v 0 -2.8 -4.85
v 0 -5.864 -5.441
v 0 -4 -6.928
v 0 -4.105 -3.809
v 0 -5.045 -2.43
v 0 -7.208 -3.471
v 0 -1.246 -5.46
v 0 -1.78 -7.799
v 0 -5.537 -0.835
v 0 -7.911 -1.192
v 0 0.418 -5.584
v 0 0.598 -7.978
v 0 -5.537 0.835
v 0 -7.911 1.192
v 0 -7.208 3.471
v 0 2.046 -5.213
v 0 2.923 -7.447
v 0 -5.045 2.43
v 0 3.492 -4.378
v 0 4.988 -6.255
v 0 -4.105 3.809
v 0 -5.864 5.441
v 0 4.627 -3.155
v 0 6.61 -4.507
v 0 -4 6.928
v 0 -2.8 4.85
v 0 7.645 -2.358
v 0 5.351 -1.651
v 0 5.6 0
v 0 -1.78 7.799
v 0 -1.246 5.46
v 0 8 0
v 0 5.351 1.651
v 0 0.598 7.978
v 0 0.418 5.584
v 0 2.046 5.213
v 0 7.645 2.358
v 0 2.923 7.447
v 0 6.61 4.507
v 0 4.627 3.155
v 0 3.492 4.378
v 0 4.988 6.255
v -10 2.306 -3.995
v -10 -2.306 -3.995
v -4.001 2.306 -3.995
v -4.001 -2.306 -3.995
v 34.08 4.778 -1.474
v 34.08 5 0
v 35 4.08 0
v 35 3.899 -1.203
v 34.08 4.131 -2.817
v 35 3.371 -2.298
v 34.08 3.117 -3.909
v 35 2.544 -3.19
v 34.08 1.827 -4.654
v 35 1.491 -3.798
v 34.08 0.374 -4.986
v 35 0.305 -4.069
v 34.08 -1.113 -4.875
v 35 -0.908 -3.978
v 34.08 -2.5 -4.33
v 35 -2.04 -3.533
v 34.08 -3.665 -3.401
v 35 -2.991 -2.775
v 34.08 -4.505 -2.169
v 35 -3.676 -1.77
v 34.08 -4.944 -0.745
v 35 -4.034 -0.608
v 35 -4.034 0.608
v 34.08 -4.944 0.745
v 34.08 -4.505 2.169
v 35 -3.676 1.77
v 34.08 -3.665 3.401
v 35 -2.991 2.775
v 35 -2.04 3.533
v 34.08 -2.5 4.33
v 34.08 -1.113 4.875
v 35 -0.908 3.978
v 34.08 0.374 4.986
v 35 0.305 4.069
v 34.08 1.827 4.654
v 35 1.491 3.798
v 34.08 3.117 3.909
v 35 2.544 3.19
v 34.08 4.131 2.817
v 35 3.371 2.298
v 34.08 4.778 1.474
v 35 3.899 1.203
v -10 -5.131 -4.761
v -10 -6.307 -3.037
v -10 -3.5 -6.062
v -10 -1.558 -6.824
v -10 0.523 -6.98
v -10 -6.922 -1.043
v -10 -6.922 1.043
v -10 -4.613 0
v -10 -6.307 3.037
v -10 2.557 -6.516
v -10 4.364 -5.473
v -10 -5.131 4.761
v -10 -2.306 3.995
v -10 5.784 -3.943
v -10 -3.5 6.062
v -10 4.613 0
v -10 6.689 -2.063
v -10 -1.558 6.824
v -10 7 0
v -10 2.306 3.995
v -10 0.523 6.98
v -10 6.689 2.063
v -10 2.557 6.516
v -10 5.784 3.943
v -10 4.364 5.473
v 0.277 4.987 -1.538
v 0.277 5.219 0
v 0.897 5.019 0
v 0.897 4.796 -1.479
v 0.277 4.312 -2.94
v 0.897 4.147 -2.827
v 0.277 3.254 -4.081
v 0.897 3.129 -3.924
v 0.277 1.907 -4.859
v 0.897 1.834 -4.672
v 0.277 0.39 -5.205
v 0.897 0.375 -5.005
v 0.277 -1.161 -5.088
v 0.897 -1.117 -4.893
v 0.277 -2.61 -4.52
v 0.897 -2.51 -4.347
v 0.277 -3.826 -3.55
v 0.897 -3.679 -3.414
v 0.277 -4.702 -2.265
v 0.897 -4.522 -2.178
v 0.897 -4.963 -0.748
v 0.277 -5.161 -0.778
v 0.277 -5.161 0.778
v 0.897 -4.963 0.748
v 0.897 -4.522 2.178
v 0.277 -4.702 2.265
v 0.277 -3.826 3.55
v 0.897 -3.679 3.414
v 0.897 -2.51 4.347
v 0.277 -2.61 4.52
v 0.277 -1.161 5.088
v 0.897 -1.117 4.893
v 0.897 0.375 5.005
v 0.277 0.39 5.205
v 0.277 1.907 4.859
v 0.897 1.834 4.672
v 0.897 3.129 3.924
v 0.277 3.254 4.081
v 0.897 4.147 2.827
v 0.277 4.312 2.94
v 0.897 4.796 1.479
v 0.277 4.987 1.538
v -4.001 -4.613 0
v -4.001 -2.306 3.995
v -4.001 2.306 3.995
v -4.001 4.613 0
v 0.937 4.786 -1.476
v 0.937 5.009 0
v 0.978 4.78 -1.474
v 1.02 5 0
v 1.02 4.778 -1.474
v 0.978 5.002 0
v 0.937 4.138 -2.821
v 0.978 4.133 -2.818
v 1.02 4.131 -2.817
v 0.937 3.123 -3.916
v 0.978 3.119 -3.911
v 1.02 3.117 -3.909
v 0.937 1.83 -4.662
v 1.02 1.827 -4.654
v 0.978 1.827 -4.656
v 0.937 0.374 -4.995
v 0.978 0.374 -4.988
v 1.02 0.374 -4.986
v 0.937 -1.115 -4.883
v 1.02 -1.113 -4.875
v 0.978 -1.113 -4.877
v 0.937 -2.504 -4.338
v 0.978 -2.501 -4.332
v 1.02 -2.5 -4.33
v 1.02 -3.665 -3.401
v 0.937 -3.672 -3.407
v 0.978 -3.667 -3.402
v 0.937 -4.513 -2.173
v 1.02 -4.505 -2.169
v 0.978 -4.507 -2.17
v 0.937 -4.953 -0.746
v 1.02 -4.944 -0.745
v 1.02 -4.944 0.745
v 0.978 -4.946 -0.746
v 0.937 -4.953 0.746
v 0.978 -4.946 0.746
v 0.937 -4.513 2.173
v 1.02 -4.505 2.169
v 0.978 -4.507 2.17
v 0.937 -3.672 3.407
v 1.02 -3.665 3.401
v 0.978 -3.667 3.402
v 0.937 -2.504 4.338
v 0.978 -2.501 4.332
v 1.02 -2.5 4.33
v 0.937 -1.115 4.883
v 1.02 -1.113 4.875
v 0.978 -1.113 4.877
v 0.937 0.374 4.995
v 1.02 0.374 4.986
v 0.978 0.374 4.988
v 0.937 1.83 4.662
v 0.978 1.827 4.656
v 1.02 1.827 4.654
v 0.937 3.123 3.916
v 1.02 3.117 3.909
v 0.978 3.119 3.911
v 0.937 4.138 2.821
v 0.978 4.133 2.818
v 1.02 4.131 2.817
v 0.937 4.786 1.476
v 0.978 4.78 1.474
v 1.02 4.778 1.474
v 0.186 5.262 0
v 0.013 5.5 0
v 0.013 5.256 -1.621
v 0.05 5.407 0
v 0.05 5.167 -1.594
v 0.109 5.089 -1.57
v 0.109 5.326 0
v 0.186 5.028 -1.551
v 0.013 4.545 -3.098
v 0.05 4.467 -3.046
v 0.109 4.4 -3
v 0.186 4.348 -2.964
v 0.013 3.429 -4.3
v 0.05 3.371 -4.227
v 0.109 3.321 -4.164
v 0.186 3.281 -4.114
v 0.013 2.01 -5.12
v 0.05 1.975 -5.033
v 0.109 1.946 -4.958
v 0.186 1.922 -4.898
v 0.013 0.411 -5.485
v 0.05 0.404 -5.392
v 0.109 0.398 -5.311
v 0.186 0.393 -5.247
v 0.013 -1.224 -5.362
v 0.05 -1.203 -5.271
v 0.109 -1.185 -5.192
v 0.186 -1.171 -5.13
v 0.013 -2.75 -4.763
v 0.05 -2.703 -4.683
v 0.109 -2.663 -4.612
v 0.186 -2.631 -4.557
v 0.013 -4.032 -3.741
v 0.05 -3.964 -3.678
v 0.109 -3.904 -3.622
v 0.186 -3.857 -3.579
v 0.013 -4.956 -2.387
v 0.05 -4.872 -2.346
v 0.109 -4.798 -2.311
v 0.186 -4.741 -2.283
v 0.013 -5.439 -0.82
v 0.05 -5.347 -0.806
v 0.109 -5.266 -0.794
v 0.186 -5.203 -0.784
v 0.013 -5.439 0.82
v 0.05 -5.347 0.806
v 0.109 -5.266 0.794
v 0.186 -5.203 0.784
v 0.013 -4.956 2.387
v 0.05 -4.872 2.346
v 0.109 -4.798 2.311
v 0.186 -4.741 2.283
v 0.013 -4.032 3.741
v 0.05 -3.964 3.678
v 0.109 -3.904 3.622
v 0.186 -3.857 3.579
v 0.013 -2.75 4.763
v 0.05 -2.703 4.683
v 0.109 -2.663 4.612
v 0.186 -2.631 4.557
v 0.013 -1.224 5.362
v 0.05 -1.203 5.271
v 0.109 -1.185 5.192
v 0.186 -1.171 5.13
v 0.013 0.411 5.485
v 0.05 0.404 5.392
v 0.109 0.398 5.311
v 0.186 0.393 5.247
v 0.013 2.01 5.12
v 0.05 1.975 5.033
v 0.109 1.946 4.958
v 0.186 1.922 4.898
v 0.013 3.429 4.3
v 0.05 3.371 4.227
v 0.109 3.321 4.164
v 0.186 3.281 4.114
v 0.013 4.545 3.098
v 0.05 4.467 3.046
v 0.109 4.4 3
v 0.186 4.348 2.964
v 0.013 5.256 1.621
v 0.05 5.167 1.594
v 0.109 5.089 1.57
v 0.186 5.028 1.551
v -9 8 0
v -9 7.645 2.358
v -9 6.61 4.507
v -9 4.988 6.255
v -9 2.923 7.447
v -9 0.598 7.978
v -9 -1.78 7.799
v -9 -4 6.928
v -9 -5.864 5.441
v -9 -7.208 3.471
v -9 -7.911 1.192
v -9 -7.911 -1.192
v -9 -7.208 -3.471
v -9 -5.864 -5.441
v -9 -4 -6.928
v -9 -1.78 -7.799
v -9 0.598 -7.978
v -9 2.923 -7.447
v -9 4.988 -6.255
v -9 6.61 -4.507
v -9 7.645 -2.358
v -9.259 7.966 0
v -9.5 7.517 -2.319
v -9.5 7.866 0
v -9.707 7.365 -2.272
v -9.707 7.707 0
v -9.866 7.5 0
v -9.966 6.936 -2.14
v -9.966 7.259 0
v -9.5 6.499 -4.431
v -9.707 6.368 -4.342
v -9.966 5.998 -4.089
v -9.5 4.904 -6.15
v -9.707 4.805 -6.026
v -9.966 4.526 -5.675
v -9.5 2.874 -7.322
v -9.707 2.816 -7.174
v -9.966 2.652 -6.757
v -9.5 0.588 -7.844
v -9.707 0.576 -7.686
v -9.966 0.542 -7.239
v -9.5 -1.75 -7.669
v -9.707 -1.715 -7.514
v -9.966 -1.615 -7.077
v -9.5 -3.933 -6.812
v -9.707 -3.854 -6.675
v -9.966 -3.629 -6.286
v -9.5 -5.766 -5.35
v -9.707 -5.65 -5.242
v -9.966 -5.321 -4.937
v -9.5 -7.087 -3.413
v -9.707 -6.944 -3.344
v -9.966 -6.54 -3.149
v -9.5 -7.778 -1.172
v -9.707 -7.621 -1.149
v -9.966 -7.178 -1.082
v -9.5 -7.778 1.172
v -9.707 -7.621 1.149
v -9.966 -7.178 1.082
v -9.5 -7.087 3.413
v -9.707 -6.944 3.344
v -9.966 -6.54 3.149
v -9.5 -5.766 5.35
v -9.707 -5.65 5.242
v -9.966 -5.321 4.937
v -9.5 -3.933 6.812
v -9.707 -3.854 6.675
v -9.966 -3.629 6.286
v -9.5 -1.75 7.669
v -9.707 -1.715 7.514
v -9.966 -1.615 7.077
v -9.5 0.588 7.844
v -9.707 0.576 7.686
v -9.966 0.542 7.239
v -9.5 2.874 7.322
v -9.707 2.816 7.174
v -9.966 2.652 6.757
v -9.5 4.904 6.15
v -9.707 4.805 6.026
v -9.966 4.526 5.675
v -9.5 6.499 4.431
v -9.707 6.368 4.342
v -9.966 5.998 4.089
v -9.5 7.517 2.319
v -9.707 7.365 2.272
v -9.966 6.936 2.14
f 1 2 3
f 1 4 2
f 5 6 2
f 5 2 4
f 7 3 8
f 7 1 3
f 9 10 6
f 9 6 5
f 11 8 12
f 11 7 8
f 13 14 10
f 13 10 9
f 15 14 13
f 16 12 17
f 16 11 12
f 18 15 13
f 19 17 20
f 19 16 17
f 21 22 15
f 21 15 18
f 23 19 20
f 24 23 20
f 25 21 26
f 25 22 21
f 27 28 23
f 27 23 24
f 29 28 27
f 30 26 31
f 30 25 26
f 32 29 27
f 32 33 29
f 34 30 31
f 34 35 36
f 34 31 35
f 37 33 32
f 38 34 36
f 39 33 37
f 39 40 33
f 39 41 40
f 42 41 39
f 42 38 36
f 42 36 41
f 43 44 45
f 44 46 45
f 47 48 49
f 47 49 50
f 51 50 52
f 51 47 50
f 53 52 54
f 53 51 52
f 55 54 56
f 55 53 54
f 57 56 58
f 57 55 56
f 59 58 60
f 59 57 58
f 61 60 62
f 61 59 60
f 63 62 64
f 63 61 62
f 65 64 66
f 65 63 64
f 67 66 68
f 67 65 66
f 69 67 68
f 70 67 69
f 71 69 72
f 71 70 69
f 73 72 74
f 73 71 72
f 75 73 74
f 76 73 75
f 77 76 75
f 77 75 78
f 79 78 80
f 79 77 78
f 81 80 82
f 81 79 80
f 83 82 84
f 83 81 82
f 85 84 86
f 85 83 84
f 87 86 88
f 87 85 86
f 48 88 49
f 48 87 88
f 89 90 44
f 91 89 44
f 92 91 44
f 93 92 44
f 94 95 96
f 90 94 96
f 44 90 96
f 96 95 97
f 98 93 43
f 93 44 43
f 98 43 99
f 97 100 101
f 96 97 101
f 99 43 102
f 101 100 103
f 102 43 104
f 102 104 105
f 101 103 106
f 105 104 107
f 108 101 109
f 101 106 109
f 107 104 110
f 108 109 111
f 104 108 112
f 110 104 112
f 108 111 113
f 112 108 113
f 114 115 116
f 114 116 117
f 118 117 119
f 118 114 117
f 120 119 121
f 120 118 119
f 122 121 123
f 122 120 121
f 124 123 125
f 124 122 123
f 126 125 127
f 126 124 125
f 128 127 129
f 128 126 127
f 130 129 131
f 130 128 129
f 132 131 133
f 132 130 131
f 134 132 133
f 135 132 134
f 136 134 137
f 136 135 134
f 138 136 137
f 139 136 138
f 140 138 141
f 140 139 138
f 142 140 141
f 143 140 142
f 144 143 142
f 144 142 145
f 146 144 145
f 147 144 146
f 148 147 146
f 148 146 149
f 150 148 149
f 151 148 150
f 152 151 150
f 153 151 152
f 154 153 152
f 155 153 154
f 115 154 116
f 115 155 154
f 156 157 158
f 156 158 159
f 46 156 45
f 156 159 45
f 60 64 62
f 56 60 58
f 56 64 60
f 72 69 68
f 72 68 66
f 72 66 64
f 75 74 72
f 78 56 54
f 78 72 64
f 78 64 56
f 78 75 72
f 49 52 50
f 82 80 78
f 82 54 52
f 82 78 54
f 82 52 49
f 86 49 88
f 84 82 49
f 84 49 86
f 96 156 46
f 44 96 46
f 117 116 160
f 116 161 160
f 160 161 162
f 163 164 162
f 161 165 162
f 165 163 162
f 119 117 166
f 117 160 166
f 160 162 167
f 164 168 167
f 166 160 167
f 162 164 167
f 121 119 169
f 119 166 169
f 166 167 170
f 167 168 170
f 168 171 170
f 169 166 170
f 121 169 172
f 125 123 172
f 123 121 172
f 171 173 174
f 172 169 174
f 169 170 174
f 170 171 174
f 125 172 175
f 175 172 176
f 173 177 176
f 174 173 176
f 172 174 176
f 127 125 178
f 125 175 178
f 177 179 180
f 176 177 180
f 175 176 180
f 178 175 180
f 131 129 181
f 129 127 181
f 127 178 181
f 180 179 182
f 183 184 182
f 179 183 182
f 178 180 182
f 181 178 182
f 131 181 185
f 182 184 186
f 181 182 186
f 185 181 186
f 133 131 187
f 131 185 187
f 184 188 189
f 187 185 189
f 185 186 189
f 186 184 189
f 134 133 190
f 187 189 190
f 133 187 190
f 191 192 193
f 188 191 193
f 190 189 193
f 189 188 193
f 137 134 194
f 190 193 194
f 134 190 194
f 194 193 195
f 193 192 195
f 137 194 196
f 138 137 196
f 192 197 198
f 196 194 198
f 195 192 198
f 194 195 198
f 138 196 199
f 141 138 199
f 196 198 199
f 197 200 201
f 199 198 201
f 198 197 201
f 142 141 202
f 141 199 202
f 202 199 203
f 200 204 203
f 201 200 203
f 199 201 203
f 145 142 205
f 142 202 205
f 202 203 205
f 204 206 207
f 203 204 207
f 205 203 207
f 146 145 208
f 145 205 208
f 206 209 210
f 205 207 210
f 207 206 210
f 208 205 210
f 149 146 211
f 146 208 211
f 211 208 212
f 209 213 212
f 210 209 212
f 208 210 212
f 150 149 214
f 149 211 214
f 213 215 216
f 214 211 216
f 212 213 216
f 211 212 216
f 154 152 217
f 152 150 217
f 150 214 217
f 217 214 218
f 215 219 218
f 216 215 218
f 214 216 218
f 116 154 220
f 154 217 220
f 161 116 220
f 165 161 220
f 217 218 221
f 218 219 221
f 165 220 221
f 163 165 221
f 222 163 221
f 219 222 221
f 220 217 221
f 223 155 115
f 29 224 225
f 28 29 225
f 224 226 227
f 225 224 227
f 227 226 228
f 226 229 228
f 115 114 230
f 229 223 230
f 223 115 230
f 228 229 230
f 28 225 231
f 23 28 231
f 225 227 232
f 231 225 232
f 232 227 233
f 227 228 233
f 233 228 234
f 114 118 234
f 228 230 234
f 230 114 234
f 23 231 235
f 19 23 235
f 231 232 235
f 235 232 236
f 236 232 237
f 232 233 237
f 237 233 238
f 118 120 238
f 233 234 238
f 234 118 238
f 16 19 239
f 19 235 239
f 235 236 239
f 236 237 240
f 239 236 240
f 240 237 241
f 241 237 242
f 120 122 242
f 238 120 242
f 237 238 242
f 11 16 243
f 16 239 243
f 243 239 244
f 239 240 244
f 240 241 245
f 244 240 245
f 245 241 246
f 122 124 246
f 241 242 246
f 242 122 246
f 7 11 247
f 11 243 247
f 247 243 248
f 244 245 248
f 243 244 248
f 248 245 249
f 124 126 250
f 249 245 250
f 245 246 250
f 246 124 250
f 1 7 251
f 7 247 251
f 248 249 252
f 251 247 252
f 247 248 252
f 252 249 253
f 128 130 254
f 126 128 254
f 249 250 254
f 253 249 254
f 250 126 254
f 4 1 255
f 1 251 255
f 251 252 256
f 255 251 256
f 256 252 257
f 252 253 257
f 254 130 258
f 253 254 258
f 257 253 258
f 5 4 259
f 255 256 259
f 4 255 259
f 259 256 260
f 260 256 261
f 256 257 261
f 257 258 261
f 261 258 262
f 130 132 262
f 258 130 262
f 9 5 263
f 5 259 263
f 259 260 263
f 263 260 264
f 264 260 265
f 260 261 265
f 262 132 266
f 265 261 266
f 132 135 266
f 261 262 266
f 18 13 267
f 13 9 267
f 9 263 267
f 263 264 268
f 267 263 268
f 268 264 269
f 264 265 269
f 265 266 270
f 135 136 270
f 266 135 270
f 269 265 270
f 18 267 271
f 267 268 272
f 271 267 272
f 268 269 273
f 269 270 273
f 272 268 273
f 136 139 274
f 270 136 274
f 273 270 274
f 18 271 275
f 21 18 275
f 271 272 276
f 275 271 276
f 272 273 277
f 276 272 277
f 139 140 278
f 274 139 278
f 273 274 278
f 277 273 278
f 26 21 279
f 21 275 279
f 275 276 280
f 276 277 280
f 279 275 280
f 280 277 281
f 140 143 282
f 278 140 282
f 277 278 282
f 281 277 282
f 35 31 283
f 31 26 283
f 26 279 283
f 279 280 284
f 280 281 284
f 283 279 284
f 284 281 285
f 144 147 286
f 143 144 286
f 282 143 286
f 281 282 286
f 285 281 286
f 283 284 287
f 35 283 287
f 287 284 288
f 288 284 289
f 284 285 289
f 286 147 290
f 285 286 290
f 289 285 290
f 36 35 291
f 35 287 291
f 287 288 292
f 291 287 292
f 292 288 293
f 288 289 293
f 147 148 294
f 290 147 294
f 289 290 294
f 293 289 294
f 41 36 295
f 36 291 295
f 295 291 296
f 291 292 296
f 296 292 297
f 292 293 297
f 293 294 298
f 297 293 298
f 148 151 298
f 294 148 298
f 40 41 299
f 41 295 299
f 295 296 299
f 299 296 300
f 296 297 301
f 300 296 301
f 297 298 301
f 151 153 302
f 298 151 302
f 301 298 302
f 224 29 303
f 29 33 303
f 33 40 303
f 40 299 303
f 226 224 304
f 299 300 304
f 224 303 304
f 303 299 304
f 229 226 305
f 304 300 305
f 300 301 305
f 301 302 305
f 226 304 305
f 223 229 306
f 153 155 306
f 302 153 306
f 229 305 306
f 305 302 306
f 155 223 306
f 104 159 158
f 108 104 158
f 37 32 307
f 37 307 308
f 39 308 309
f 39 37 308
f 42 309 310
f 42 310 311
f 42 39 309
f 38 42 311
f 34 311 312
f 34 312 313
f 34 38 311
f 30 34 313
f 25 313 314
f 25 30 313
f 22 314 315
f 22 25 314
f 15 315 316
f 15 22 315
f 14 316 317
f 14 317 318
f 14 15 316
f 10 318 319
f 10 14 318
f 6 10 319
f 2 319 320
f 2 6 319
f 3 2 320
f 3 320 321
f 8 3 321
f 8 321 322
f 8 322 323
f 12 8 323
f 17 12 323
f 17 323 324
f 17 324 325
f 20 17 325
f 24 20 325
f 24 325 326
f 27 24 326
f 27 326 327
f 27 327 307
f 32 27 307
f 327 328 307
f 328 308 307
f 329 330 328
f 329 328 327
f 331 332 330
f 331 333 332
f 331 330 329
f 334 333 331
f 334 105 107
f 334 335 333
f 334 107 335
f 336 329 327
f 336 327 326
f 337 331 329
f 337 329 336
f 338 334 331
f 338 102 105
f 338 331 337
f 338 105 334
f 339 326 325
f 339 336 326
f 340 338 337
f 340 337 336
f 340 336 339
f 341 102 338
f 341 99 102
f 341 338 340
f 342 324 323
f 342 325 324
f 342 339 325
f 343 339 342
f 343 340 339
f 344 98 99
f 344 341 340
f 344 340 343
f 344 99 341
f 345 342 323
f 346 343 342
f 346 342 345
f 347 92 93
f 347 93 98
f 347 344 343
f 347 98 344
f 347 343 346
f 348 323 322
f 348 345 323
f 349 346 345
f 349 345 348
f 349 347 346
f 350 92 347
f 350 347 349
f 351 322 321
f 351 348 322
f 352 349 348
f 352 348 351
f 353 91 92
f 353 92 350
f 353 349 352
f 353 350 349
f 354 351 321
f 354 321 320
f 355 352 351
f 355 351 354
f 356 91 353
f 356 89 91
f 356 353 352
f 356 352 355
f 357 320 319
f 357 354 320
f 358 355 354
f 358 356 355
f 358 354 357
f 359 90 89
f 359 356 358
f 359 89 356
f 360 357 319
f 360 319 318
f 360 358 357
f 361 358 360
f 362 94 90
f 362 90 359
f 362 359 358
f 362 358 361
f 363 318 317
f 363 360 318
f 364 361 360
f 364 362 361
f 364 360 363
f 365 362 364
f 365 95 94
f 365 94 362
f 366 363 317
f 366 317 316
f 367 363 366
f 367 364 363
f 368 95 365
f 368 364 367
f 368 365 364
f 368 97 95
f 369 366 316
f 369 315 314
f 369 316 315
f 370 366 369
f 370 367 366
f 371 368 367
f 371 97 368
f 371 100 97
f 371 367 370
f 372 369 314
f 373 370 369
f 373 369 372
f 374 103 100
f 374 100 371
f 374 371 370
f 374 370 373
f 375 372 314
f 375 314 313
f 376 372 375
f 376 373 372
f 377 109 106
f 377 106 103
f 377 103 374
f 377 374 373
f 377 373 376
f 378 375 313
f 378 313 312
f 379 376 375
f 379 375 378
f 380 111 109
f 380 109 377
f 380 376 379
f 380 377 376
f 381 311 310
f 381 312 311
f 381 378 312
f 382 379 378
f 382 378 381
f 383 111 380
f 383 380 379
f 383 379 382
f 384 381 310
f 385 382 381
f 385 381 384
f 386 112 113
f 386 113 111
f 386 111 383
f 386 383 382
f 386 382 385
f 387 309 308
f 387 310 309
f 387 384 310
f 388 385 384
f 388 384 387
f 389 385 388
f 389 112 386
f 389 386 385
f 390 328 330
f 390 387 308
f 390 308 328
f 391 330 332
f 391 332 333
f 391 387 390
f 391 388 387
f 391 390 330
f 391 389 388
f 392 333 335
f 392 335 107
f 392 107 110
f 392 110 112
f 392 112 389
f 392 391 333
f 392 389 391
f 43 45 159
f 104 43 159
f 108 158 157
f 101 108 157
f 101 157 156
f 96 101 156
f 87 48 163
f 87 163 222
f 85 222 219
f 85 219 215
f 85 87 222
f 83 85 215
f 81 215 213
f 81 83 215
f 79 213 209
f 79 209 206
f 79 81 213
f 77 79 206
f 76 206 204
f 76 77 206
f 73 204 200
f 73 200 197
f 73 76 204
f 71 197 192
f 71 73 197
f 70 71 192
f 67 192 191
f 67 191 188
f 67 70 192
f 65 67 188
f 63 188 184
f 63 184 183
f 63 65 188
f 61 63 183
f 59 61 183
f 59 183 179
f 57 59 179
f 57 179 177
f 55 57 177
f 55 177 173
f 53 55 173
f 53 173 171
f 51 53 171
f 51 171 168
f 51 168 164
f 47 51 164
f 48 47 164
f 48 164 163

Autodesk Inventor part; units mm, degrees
sketch "Skizze_2" plane through (0, 0, 0) normal (0, 0, 1) x (1, 0, 0)
  line L0 (38, 0) -> (-10, 0)
  line L1 (-10, 0) -> (-10, 7)
  arc A0 (-9, 8) -> (-10, 7) centre (-9, 7) ccw
  line L2 (-9, 8) -> (0, 8)
  line L3 (0, 8) -> (0, 5.6)
  arc A1 (0, 5.6) -> (0.2772, 5.2193) centre (0.4, 5.6) ccw
  line L4 (0.2772, 5.2193) -> (0.8972, 5.0193)
  arc A2 (0.8972, 5.0193) -> (1.02, 5) centre (1.02, 5.4) ccw
  line L5 (1.02, 5) -> (34.08, 5)
  line L6 (34.08, 5) -> (35, 4.08)
  line L7 (35, 4.08) -> (35, 0)
  line L8 (35, 0) -> (-10, 0)
revolve "Revolution1" add sketch "Skizze_2" angle 360 about axis through (38, 0, 0) along (1, 0, 0)
thread "Thread1" size "M10x1.5" class "6g" standard "ISO Metric profile" length 30.5
sketch "Skizze_1" plane through (-4.001, 0, 0) normal (1, 0, 0) x (0, 0, -1)
  line L0 (-3.995, -2.3065) -> (0, -4.613)
  line L1 (0, -4.613) -> (3.995, -2.3065)
  line L2 (3.995, -2.3065) -> (3.995, 2.3065)
  line L3 (3.995, 2.3065) -> (0, 4.613)
  line L4 (0, 4.613) -> (-3.995, 2.3065)
  line L5 (-3.995, 2.3065) -> (-3.995, -2.3065)
extrude "Extrusion1" cut sketch "Skizze_1" against normal blind 10.01
ref_plane "IP1_XY" through (0, 0, 0) normal (1, 0, 0) x (0, 0, -1)
ref_plane "IP1_YZ" through (0, 0, 0) normal (0, 0, -1) x (0, 1, 0)
ref_plane "IP1_ZX" through (0, 0, 0) normal (0, 1, 0) x (1, 0, 0)
ref_plane "IP2_XY" through (-10, 0, 0) normal (1, 0, 0) x (0, 0, -1)
ref_plane "IP2_YZ" through (-10, 0, 0) normal (0, 0, -1) x (0, 1, 0)
ref_plane "IP2_ZX" through (-10, 0, 0) normal (0, 1, 0) x (1, 0, 0)
ref_plane "IP3_XY" through (35, 0, 0) normal (1, 0, 0) x (0, 0, -1)
ref_plane "IP3_YZ" through (35, 0, 0) normal (0, 0, -1) x (0, 1, 0)
ref_plane "IP3_ZX" through (35, 0, 0) normal (0, 1, 0) x (1, 0, 0)
properties part number "Slotted head cap screw ISO 4762 - M10x35"
